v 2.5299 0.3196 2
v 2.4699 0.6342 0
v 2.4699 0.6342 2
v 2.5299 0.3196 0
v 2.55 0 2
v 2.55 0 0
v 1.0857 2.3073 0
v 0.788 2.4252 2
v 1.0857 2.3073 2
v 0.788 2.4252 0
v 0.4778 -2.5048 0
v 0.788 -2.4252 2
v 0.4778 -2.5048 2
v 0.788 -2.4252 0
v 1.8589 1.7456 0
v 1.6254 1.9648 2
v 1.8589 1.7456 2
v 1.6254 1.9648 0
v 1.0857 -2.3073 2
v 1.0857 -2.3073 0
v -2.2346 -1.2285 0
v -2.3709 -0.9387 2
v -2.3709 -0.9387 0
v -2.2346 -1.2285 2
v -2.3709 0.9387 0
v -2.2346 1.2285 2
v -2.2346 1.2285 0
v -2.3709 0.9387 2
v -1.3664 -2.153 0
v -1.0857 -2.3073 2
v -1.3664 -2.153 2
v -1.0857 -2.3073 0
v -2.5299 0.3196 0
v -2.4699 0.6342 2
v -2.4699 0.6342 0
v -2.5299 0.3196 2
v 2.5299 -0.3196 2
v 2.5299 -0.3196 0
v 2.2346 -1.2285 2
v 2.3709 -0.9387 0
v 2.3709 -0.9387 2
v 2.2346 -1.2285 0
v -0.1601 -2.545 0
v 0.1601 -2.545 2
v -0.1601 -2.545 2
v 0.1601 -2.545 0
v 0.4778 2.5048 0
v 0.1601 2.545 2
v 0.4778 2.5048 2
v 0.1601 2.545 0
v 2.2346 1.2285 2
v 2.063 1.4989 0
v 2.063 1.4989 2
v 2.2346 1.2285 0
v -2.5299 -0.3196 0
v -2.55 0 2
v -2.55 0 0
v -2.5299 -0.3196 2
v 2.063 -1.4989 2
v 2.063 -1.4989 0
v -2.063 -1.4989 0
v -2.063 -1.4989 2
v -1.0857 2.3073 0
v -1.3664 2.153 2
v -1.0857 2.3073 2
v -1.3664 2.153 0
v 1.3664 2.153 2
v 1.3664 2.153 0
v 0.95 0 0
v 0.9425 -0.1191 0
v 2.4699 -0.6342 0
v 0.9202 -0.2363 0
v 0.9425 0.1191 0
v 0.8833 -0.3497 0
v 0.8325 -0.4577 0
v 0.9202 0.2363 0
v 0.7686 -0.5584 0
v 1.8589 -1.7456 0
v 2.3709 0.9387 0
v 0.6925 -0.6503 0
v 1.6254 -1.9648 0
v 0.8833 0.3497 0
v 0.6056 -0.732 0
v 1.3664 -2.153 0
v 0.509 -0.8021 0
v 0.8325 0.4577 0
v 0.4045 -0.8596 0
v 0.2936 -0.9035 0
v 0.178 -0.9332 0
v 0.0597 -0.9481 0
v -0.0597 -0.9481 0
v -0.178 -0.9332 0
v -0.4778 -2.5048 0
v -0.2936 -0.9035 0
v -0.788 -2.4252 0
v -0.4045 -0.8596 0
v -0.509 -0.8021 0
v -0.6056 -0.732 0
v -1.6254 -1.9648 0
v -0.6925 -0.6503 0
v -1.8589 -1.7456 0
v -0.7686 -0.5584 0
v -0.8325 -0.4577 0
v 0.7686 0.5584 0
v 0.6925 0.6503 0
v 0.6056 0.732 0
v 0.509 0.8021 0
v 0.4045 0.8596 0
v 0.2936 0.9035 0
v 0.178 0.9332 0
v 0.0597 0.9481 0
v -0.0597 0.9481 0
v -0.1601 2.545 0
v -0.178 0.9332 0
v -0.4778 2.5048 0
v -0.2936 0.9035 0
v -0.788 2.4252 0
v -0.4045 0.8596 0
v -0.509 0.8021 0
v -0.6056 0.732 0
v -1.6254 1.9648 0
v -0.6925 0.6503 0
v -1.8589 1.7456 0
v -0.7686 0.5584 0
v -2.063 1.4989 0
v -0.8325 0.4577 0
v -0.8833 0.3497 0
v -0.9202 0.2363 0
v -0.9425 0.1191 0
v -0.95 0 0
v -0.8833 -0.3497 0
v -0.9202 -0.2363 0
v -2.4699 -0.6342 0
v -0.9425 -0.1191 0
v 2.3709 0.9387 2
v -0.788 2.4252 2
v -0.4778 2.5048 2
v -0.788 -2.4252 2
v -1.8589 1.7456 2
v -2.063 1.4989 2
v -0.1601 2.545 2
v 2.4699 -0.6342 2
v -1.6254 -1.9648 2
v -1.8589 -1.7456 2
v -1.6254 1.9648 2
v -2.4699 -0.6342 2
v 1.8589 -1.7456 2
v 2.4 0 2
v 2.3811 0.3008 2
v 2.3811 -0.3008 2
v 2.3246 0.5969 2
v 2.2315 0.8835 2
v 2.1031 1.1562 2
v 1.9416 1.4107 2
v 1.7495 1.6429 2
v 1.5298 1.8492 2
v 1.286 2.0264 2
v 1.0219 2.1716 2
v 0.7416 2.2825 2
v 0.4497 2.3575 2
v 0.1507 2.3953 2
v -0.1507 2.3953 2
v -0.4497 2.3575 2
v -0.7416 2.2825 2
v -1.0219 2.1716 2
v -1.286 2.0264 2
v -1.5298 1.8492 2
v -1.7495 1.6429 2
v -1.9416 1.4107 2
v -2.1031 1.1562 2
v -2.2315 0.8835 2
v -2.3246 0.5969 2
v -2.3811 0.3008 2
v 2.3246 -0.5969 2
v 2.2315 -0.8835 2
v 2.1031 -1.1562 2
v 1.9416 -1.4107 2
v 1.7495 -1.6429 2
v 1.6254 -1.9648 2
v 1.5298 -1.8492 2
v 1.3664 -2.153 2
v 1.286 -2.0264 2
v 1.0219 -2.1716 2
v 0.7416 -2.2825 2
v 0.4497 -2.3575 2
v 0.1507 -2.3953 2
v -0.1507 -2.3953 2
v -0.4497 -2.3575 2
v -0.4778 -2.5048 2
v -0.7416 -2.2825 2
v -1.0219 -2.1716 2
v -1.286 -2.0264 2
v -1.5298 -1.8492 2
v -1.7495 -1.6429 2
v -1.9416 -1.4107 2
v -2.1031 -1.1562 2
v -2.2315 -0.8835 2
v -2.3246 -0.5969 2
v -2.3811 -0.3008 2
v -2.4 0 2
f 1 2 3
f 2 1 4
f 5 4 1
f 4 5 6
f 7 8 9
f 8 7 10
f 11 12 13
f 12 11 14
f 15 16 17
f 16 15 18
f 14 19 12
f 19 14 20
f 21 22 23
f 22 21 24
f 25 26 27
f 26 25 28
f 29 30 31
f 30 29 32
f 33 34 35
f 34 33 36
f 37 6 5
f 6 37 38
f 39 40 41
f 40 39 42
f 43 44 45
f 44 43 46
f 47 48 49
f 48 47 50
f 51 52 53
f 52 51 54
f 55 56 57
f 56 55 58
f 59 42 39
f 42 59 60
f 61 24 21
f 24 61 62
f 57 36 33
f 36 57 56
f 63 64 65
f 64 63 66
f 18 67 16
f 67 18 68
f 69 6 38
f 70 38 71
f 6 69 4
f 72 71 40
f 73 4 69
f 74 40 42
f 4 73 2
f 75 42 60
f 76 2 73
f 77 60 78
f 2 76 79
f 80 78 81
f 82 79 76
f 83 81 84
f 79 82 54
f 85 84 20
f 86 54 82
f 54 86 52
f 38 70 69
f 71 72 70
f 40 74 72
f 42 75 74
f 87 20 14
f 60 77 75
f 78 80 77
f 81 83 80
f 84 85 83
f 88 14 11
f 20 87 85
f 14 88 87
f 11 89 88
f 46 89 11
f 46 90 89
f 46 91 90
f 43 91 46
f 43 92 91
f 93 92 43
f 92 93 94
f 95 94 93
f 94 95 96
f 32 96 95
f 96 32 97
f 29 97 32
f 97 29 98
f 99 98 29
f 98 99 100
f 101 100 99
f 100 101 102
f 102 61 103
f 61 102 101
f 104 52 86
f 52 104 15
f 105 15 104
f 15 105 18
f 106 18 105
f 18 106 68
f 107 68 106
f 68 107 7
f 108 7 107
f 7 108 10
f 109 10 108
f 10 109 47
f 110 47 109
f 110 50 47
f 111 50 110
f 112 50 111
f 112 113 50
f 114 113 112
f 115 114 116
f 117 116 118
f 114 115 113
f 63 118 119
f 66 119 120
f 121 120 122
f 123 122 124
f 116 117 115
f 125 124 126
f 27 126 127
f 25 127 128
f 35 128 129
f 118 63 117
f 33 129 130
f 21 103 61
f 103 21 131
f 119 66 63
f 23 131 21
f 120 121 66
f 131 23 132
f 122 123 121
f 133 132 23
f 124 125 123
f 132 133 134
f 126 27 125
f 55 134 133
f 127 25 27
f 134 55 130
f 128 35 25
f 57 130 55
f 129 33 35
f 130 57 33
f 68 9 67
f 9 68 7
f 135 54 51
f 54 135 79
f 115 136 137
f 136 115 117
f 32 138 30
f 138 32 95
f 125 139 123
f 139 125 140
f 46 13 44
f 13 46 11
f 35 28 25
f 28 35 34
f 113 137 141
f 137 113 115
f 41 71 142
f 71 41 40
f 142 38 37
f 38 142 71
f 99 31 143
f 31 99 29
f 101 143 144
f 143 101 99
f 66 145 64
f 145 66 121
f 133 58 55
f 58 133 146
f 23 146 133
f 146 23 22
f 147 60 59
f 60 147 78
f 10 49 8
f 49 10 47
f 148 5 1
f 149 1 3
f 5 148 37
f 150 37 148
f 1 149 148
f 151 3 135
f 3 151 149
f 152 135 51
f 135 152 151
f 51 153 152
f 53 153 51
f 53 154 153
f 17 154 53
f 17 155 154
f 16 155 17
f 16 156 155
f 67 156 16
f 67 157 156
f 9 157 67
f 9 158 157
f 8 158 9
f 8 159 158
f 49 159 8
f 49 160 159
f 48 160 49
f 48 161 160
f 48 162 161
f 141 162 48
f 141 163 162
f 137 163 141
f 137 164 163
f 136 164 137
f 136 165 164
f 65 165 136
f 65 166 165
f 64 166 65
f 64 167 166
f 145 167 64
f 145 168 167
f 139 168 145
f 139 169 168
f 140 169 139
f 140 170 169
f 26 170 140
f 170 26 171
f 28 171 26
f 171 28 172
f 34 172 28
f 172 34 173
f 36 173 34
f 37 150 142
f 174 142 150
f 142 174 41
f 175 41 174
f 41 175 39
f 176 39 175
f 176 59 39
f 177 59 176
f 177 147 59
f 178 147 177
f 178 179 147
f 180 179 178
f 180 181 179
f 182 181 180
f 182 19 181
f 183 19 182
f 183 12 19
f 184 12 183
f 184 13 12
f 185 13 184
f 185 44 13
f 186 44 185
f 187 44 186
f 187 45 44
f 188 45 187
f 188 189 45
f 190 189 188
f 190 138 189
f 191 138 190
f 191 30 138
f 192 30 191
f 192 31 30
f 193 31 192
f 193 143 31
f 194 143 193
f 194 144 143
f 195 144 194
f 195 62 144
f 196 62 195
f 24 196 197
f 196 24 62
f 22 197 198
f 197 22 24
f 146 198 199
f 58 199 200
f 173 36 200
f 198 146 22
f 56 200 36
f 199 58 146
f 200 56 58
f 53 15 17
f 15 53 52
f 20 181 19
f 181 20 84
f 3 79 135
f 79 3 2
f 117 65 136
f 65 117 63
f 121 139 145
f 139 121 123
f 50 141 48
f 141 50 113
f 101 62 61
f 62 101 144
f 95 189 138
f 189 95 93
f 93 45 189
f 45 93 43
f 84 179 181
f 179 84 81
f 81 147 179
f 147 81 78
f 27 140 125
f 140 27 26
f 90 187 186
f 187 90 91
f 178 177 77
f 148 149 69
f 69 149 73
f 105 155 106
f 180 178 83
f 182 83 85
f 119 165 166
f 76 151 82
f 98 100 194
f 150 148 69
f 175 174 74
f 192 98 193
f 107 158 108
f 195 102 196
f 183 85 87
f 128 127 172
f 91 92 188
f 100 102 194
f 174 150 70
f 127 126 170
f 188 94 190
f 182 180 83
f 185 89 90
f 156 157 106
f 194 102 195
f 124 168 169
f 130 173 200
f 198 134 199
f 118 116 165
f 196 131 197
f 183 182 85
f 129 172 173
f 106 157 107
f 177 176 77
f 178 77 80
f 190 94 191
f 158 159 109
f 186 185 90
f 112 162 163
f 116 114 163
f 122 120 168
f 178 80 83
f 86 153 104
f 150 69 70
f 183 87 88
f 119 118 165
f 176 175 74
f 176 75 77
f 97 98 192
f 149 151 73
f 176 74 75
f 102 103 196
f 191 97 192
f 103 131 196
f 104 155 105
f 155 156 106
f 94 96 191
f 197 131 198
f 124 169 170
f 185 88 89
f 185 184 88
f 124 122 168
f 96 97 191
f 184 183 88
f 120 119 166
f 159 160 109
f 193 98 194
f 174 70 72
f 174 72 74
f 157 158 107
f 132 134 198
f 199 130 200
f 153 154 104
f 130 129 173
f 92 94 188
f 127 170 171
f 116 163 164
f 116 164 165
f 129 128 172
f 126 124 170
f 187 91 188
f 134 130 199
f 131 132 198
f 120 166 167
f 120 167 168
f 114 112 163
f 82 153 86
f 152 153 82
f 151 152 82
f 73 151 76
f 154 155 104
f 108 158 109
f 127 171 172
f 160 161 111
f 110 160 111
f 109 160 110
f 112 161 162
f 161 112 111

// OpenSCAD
//This is a fix for loading filament for some PTFE couplers
//
//While on the CR-10 I have no issues in loading, on the Ender 3 shipped ATM seems to be a different kind of coupler which makes almost impossible to push through, despite filament being cut (two ways) properly, twisted, so on.., so I designed this very tiny thing :) which guides the filament better.
//
//Print it at 0.04, you might need to scale it to fit perfectly, with no play in the threaded hole, if it not fits already, then the coupler will push it when screwing in.
//
//Take care to mount it in proper direction in between the extruder cover and PTFE coupler as shown in image where the fix is pictured in green in thingiverse page.
//
//Have better time in loading now..:)

// published at
// https://www.thingiverse.com/thing:3654254



// Edit the part between the scissors 
// ------8<------------------------

// The height of the fix, needs to fill the gap between the end of the coupler's thread and end of the extruder's threaded hole.
TubeHeight=2; 

// The interior diameter the extruder's threaded hole.
TubeDiam=5.2;

// The diameter of the hole toward the extruder,  needs to be a bit larger than the hole from gear where the filament enters for filament to pass through with ease.
ExtruderHoleDiam=4.8;

// The diameter of the hole toward the coupler needs to be the same or a bit smaller than the diameter of the brass hole, for filament to pass through with ease.
CouplerHoleDiam=1.9;

// Details of the thing, a large number will require more polygons and computational power. 
Details=50;

// ------8<------------------------


difference() {
cylinder(h = TubeHeight, r1 = (TubeDiam-0.1)/2, r2 = (TubeDiam-0.1)/2, center = true/false, $fn = Details);
cylinder(h = TubeHeight, r1 = CouplerHoleDiam/2, r2 = ExtruderHoleDiam/2, center = true/false, $fn = Details);
}
